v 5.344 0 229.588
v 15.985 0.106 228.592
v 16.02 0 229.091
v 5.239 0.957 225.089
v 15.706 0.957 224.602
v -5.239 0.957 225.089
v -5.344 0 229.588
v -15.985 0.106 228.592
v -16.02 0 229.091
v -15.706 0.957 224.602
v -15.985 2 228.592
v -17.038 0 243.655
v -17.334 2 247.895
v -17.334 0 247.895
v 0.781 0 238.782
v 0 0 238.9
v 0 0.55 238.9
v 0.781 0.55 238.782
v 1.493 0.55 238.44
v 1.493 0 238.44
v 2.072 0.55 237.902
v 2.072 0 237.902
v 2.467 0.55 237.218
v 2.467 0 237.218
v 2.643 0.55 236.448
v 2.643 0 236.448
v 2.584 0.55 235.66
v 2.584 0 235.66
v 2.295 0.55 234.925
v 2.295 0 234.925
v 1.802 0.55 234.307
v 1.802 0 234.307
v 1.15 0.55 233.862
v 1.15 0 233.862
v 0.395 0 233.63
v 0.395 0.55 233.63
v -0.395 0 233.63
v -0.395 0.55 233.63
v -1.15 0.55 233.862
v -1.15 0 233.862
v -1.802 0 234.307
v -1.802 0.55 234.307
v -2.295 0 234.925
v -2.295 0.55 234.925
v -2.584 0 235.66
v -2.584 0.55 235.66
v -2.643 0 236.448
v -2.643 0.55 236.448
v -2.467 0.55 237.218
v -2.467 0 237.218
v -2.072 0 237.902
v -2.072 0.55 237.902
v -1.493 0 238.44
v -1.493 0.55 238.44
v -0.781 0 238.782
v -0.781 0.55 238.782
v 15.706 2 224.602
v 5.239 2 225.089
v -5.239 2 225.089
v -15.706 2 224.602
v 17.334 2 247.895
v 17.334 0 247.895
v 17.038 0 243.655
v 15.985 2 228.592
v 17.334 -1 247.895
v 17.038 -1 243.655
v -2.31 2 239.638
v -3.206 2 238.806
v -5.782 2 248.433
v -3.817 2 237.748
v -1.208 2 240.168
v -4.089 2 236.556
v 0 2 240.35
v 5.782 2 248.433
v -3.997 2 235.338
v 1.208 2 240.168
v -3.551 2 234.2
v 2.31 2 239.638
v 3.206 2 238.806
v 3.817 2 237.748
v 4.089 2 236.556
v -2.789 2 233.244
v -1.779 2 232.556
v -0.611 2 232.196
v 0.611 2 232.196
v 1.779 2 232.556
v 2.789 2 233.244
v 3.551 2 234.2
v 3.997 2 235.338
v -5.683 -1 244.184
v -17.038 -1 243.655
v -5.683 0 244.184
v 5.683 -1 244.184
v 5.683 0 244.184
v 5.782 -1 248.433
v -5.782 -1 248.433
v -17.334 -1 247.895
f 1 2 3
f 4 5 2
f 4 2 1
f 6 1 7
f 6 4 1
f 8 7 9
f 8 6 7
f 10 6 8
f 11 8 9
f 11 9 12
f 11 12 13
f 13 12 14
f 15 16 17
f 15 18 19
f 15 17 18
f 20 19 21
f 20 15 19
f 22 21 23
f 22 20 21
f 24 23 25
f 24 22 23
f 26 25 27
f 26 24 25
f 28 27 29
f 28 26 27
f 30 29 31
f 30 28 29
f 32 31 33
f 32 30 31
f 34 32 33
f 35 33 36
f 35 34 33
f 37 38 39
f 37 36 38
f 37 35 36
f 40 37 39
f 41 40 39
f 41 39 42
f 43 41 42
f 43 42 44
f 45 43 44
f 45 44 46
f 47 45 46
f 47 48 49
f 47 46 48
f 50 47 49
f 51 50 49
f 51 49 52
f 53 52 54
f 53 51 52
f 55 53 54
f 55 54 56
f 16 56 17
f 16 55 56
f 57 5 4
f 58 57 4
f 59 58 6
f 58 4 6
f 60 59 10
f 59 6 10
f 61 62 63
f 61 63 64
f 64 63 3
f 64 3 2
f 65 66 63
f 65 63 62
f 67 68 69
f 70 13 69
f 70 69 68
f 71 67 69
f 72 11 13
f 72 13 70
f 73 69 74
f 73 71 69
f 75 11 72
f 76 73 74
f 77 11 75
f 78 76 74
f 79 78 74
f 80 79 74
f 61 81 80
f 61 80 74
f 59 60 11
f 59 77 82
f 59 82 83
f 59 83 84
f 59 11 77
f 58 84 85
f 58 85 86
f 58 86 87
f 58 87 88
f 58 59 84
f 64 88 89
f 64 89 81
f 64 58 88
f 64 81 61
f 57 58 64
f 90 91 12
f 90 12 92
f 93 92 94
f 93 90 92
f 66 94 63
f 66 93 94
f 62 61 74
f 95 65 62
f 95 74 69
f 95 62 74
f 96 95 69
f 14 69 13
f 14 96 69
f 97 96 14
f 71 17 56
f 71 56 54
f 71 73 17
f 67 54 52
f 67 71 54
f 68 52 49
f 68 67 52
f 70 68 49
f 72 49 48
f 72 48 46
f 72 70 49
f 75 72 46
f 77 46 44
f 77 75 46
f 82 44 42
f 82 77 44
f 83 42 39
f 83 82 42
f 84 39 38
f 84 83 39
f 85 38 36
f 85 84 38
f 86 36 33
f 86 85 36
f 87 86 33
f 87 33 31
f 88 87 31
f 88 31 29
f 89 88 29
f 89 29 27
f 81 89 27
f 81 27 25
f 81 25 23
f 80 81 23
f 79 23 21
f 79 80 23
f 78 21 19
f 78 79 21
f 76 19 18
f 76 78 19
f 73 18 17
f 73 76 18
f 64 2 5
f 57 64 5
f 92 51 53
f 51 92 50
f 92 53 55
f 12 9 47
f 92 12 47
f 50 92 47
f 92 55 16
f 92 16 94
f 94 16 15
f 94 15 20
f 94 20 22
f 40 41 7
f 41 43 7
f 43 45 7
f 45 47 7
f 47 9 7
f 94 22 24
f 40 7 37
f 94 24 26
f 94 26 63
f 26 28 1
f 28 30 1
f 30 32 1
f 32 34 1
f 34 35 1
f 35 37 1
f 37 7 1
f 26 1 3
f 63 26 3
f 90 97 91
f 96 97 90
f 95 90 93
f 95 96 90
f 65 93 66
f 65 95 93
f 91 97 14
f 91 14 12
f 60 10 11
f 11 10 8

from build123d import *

# Parameters (mm, degrees)
SKETCH2_R           = 2.65
BOSS_EXTRUDE1_DEPTH = 2
BOSS_EXTRUDE2_DEPTH = 2
CHAMFER1_SIZE       = 4.5
CHAMFER1_SIZE2      = 0.956504528
BOSS_EXTRUDE3_START = 1
BOSS_EXTRUDE3_DEPTH = 1


with BuildPart() as part:
    # Sketch2 → Boss-Extrude1 (new body)
    with BuildSketch(Plane(origin=(0, 0, 0), x_dir=(1, 0, 0), z_dir=(0, 1, 0))):
        with BuildLine():
            Line((-15.984695958, -228.591802117), (-17.334483725, -247.89466649))
            ThreePointArc((-17.334483725, -247.89466649), (0, -248.5), (17.334483725, -247.89466649))
            Line((17.334483725, -247.89466649), (15.984695958, -228.591802117))
            ThreePointArc((15.984695958, -228.591802117), (0, -229.15), (-15.984695958, -228.591802117))
        make_face()
        with Locations(Location((0, -236.25, 0), (0, 0, 270))):
            Circle(SKETCH2_R, mode=Mode.SUBTRACT)
    extrude(amount=BOSS_EXTRUDE1_DEPTH)

    # Sketch3 → Boss-Extrude2 (add)
    with BuildSketch(Plane(origin=(0, 0, 0), x_dir=(1, 0, 0), z_dir=(0, 1, 0))):
        with BuildLine():
            Line((-15.705670063, -224.601545916), (-15.984695958, -228.591802117))
            ThreePointArc((-15.984695958, -228.591802117), (0, -229.15), (15.984695958, -228.591802117))
            Line((15.984695958, -228.591802117), (15.705670063, -224.601545916))
            ThreePointArc((15.705670063, -224.601545916), (0, -225.15), (-15.705670063, -224.601545916))
        make_face()
    extrude(amount=BOSS_EXTRUDE2_DEPTH)

    # Chamfer1
    chamfer1_edges = [part.edges().sort_by_distance(p)[0] for p in [
        (0, 0, 225.15),
    ]]
    chamfer1_side = [part.faces().sort_by_distance(p)[0] for p in [
        (16.100023839, 0, 236.277479174),
    ]]
    chamfer(chamfer1_edges, length=CHAMFER1_SIZE, length2=CHAMFER1_SIZE2, reference=chamfer1_side[0])

    # Sketch4 → Boss-Extrude3 (add)
    with BuildSketch(Plane.XZ.offset(BOSS_EXTRUDE3_START)):
        with BuildLine():
            Line((-17.334483725, 247.89466649), (-17.038018712, 243.655019276))
            ThreePointArc((-17.038018712, 243.655019276), (0, 244.25), (17.038018712, 243.655019276))
            Line((17.038018712, 243.655019276), (17.334483725, 247.89466649))
            ThreePointArc((17.334483725, 247.89466649), (0, 248.5), (-17.334483725, 247.89466649))
        make_face()
    extrude(amount=-BOSS_EXTRUDE3_DEPTH)

    # Sketch20 → CSK for M3.5 Flat Head Machine Screw2 (revolve, cut)
    with BuildSketch(Plane(origin=(0, 2, 236.25), x_dir=(0, 0, 1), z_dir=(1, 0, 0))):
        Polygon((0, 0), (0, 3), (1.85, 3), (1.85, 2.25), (4.1, 0), align=None)
    revolve(axis=Axis((0, 8.35, 236.25), (0, -1, 0)), mode=Mode.SUBTRACT)


solid = part.part
